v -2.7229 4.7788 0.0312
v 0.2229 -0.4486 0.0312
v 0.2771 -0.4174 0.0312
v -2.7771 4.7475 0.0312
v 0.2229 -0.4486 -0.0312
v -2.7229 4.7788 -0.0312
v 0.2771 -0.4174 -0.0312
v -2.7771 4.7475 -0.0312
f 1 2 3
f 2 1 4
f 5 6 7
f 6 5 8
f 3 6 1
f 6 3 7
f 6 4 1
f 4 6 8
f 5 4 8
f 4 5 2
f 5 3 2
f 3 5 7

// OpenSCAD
//######################################
// trimming_square_spar
// (c) 2021 - Roie R. Black
//**************************************

module trimming_square_spar(length=5, size=1/16, angle=30) {
  calcl = length+1;
  dx = 0.5;

  rotate([0,0,90+angle])
  translate([-dx,-size/2,-size/2])
    cube([calcl,size,size]);
}

trimming_square_spar();
